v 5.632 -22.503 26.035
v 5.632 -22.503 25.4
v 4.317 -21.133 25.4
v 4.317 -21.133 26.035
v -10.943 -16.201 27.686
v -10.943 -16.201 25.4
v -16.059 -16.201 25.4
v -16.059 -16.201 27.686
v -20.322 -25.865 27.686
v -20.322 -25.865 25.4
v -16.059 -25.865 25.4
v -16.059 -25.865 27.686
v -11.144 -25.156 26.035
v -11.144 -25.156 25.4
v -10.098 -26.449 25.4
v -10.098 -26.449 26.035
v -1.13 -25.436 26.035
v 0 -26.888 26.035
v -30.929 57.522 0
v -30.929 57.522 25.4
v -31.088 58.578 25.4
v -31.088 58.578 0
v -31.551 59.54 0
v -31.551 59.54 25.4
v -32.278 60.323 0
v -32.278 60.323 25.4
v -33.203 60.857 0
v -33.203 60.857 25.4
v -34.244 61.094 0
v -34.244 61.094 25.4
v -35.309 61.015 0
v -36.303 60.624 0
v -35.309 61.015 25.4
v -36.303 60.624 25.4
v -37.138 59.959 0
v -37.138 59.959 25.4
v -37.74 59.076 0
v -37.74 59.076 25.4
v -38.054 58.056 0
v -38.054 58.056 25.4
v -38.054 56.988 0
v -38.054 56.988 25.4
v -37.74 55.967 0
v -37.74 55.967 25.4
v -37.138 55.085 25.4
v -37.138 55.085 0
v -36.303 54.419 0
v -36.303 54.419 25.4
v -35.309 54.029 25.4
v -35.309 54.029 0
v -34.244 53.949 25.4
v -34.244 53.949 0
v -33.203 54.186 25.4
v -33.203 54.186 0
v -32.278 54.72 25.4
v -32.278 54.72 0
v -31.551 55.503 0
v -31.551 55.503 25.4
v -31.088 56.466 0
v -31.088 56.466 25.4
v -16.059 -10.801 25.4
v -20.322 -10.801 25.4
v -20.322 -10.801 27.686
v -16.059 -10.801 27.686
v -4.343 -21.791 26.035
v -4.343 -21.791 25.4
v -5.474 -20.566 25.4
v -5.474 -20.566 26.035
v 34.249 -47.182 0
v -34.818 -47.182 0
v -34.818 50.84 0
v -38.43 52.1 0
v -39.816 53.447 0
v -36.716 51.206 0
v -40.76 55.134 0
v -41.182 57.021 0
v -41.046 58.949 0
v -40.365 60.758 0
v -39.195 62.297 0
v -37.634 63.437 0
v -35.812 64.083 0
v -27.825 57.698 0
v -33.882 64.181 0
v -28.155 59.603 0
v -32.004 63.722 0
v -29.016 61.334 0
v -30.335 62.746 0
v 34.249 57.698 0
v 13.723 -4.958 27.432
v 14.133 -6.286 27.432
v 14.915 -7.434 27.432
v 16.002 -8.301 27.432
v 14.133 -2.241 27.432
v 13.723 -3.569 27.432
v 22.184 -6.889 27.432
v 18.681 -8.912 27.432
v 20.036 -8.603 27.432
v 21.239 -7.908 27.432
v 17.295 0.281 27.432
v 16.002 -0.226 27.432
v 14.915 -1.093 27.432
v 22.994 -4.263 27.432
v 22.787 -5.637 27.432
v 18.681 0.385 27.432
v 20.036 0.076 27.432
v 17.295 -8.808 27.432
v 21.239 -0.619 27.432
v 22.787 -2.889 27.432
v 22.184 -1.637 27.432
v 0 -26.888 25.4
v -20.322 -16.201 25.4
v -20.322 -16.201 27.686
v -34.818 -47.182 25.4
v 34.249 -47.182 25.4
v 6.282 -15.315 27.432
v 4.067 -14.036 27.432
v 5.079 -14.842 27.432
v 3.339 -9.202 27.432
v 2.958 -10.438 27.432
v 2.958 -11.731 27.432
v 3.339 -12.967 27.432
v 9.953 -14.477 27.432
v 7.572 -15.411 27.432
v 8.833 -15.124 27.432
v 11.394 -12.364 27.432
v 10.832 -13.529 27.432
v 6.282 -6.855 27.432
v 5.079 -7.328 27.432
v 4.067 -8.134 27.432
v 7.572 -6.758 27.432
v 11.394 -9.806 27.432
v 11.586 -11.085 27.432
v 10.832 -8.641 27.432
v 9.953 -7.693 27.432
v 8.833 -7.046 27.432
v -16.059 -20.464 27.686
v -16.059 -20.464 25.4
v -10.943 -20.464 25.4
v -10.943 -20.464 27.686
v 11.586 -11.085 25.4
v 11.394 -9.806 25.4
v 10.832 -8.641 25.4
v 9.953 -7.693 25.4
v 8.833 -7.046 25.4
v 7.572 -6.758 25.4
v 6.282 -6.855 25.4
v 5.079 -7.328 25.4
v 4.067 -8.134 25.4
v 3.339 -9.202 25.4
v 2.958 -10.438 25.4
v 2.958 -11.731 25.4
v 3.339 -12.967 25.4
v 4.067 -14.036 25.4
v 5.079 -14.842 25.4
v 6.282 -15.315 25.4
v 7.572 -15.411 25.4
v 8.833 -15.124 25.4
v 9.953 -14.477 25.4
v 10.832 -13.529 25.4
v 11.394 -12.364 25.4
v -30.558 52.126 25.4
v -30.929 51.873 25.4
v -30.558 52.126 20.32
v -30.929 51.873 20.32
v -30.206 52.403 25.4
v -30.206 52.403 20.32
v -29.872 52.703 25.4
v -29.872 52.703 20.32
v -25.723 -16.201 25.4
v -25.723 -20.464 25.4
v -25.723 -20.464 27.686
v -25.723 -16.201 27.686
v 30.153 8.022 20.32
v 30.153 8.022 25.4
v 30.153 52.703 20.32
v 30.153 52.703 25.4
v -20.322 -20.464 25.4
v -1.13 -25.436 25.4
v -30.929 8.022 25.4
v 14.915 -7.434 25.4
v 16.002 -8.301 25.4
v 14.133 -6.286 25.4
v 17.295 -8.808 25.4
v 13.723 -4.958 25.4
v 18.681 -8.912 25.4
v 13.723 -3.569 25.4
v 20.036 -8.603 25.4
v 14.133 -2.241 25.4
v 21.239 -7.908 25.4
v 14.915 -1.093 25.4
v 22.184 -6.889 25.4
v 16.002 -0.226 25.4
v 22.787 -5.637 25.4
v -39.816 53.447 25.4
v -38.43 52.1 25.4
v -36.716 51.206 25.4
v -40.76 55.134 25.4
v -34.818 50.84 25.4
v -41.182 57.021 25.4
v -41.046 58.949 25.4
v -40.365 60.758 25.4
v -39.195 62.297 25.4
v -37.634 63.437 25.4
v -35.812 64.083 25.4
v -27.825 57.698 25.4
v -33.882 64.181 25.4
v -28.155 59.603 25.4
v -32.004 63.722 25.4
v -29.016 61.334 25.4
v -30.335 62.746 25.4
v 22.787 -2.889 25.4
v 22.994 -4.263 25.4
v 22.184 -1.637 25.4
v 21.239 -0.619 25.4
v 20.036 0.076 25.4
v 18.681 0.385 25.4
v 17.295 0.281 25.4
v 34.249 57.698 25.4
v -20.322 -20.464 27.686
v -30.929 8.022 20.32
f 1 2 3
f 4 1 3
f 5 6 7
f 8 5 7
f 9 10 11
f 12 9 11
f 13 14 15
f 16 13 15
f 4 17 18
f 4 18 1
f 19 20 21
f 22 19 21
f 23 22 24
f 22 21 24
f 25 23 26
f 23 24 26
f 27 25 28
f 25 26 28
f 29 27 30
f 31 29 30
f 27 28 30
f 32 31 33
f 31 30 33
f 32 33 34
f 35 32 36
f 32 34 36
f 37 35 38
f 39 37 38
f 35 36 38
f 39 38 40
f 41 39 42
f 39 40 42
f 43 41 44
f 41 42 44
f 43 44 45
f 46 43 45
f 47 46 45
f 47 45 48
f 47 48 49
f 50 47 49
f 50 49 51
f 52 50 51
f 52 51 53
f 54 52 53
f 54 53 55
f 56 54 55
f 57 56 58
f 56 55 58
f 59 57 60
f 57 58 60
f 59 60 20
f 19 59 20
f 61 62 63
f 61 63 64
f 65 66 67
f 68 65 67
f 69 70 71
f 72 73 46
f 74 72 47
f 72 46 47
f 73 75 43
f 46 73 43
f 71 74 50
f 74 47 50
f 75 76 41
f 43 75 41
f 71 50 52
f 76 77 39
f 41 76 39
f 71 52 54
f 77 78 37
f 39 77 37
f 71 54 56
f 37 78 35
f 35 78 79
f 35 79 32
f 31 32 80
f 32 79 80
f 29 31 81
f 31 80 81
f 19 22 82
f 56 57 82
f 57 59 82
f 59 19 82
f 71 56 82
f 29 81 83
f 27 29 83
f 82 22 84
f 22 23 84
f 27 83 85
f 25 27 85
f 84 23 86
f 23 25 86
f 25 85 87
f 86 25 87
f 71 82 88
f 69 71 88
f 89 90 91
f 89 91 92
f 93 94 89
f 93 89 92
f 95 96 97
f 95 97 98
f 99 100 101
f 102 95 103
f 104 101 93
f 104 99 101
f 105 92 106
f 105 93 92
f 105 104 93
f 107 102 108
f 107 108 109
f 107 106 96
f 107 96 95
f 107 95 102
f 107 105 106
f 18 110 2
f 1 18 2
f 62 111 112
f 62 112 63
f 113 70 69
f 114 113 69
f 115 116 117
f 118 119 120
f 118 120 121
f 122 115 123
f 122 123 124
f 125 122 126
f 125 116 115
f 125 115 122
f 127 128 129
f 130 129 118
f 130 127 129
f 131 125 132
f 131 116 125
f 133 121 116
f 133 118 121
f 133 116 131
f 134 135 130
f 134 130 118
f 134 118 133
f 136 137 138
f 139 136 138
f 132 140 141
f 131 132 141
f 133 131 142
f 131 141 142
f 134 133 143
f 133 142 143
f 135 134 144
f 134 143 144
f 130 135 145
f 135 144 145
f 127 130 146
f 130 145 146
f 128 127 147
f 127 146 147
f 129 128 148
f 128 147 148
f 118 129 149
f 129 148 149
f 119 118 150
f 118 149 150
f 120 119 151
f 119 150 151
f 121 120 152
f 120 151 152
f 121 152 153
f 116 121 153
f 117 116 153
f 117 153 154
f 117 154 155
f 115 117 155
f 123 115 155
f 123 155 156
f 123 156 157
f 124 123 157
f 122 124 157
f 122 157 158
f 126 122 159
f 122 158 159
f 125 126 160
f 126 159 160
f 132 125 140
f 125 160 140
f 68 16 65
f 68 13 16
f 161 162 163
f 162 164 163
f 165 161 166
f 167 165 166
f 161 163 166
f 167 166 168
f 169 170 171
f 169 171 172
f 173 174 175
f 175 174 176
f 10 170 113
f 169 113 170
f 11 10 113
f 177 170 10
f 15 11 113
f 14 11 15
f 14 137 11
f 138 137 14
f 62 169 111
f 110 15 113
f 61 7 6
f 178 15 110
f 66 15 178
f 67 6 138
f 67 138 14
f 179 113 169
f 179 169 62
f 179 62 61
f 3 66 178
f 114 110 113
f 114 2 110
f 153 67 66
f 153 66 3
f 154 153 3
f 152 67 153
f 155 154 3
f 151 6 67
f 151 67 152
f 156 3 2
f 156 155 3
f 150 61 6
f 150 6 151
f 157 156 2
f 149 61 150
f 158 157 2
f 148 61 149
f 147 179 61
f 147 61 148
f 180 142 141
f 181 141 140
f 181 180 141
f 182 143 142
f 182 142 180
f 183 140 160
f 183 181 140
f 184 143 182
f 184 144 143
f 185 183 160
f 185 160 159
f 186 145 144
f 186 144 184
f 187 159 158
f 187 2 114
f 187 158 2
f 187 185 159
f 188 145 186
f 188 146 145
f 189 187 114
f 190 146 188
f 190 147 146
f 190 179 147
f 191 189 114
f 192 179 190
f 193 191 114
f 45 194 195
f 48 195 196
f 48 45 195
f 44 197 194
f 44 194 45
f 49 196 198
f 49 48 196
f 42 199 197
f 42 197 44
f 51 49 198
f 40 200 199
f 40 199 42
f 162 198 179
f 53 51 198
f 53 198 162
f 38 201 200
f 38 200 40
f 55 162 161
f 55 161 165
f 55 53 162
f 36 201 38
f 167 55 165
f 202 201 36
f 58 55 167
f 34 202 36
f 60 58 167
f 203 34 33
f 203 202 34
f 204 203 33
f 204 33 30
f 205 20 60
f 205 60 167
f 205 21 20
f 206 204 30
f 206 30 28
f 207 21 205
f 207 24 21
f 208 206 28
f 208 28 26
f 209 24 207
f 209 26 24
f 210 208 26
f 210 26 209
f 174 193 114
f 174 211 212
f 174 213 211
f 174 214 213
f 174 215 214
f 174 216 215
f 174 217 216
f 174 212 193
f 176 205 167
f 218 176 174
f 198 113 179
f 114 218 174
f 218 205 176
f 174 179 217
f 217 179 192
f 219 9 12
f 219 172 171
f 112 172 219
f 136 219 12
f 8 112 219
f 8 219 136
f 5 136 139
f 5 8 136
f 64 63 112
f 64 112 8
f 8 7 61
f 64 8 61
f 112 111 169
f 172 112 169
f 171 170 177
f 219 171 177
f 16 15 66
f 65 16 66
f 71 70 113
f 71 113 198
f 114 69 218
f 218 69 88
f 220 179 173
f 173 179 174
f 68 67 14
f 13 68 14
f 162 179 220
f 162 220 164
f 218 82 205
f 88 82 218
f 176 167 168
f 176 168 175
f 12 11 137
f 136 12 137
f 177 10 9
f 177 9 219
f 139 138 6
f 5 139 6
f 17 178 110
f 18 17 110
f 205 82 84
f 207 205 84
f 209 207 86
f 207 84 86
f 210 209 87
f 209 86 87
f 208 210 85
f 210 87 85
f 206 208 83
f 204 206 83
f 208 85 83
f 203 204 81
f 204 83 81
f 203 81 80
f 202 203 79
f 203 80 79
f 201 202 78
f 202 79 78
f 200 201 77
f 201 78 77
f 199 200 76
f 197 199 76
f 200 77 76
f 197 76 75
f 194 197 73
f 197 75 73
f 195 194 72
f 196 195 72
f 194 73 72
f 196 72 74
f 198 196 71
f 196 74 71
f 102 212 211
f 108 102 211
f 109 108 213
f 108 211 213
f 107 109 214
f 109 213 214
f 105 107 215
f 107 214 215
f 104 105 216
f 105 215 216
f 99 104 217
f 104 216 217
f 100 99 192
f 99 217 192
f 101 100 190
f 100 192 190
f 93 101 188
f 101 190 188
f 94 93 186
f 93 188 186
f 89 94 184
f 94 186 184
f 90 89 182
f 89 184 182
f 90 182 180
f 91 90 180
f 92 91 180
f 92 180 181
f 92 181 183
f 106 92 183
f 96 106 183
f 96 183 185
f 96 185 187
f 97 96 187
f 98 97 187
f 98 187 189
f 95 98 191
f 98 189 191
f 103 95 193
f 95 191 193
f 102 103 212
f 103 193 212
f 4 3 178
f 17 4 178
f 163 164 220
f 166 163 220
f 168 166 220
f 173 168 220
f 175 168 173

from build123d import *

# Parameters (mm, degrees)
F0_W      = 69.0672509372
F0_H      = 104.8798933625
F1_DEPTH  = 25.4
F2_W      = 61.0817540437
F2_H      = 44.6812286973
F3_DEPTH  = 5.08
F5_R      = 6.6887407384
F6_DEPTH  = 25.4
F7_R      = 3.582784906
F8_DEPTH  = 25.4
F9_W      = 4.2634103447
F9_H      = 5.4003186524
F9_W_2    = 5.400320515
F9_H_2    = 4.2634103447
F9_W_3    = 5.1160920411
F9_H_3    = 5.4003195837
F10_DEPTH = 2.286
F4_R      = 4.3385405976
F4_R_2    = 4.6616734777
F11_DEPTH = 2.032
F14_DEPTH = 0.635


with BuildPart() as f1:
    # F0 (on Top) → F1 (new body)
    with BuildSketch(Plane.XY):
        with Locations((-0.2842266113, 5.2582062781)):
            Rectangle(F0_W, F0_H)
    extrude(amount=F1_DEPTH)

    # F2 (on face) → F3 (cut)
    with BuildSketch(Plane.XY.offset(25.4)):
        with Locations((-0.3880532458, 30.3628817201)):
            Rectangle(F2_W, F2_H)
    extrude(amount=-F3_DEPTH, mode=Mode.SUBTRACT)

    # F5 (on Top) → F6 (join)
    with BuildSketch(Plane.XY):
        with Locations((-34.5117151737, 57.5216077268)):
            Circle(F5_R)
    extrude(amount=F6_DEPTH)

    # F7 (on face) → F8 (cut)
    with BuildSketch(Plane.XY.offset(25.4)):
        with Locations((-34.5117151737, 57.5216077268)):
            Circle(F7_R)
    extrude(amount=-F8_DEPTH, mode=Mode.SUBTRACT)

    # F9 (on face) → F10 (join)
    with BuildSketch(Plane.XY.offset(25.4)):
        with Locations((-18.1905506179, -23.1645293534)):
            Rectangle(F9_W, F9_H)
        with Locations((-23.0224160478, -18.3326648548)):
            Rectangle(F9_W_2, F9_H_2)
        with Locations((-18.1905506179, -18.3326648548)):
            Rectangle(F9_W, F9_H_2)
        with Locations((-13.5007994249, -18.3326648548)):
            Rectangle(F9_W_3, F9_H_2)
        with Locations((-18.1905506179, -13.5007998906)):
            Rectangle(F9_W, F9_H_3)
    extrude(amount=F10_DEPTH)

    # F4 (on face) → F11 (join)
    with BuildSketch(Plane.XY.offset(25.4)):
        with Locations((7.2477986105, -11.08486671)):
            Circle(F4_R)
        with Locations((18.3326639235, -4.2634103447)):
            Circle(F4_R_2)
    extrude(amount=F11_DEPTH)

    # F12 (on face) + F13 (on face) → F14 (join)
    with BuildSketch(Plane.XY.offset(25.4)):
        Polygon((5.6323851459, -22.5031040609), (4.3169683777, -21.1328770965), (-1.1299567856, -25.4363407869), (0, -26.8878247589), align=None)
    with BuildSketch(Plane.XY.offset(25.4)):
        Polygon((-10.0978044793, -26.4493525028), (-4.3428572826, -21.790586412), (-5.4735084007, -20.5657135335), (-11.1444314917, -25.1564601203), align=None)
    extrude(amount=F14_DEPTH)


solid = f1.part
